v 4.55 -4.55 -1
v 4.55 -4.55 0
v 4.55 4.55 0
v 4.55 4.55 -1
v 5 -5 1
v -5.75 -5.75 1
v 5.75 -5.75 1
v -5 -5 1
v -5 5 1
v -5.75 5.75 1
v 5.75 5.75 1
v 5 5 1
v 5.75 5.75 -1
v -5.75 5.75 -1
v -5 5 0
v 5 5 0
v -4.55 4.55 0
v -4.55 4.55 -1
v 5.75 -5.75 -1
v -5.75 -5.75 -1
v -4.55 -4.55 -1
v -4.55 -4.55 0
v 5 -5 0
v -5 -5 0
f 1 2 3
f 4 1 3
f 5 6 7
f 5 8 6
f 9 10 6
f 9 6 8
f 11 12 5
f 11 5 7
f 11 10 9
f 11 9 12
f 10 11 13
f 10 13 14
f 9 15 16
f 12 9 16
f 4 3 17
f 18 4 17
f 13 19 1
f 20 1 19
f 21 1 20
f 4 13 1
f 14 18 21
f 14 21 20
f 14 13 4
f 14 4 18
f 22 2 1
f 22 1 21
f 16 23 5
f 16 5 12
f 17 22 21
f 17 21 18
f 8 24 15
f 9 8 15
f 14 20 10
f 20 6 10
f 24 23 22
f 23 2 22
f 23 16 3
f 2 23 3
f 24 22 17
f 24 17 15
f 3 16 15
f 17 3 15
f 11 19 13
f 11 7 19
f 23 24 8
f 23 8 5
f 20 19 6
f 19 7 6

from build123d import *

# Parameters (mm, degrees)
SKETCH_1_W      = 11.5
SKETCH_1_H      = 11.5
SKETCH_1_W_2    = 10
SKETCH_1_H_2    = 10
EXTRUDE_1_DEPTH = 1
SKETCH_2_W      = 11.5
SKETCH_2_H      = 11.5
SKETCH_2_W_2    = 9.1
SKETCH_2_H_2    = 9.1
EXTRUDE_2_DEPTH = 1


with BuildPart() as part:
    # 草图1 → 凸台-拉伸1 (new body)
    with BuildSketch(Plane.XY):
        Rectangle(SKETCH_1_W, SKETCH_1_H)
        Rectangle(SKETCH_1_W_2, SKETCH_1_H_2, mode=Mode.SUBTRACT)
    extrude(amount=EXTRUDE_1_DEPTH)

    # 草图2 → 凸台-拉伸2 (add)
    with BuildSketch(Plane(origin=(0, 0, 0), x_dir=(-1, 0, 0), z_dir=(0, 0, -1))):
        Rectangle(SKETCH_2_W, SKETCH_2_H)
        Rectangle(SKETCH_2_W_2, SKETCH_2_H_2, mode=Mode.SUBTRACT)
    extrude(amount=EXTRUDE_2_DEPTH)


solid = part.part
